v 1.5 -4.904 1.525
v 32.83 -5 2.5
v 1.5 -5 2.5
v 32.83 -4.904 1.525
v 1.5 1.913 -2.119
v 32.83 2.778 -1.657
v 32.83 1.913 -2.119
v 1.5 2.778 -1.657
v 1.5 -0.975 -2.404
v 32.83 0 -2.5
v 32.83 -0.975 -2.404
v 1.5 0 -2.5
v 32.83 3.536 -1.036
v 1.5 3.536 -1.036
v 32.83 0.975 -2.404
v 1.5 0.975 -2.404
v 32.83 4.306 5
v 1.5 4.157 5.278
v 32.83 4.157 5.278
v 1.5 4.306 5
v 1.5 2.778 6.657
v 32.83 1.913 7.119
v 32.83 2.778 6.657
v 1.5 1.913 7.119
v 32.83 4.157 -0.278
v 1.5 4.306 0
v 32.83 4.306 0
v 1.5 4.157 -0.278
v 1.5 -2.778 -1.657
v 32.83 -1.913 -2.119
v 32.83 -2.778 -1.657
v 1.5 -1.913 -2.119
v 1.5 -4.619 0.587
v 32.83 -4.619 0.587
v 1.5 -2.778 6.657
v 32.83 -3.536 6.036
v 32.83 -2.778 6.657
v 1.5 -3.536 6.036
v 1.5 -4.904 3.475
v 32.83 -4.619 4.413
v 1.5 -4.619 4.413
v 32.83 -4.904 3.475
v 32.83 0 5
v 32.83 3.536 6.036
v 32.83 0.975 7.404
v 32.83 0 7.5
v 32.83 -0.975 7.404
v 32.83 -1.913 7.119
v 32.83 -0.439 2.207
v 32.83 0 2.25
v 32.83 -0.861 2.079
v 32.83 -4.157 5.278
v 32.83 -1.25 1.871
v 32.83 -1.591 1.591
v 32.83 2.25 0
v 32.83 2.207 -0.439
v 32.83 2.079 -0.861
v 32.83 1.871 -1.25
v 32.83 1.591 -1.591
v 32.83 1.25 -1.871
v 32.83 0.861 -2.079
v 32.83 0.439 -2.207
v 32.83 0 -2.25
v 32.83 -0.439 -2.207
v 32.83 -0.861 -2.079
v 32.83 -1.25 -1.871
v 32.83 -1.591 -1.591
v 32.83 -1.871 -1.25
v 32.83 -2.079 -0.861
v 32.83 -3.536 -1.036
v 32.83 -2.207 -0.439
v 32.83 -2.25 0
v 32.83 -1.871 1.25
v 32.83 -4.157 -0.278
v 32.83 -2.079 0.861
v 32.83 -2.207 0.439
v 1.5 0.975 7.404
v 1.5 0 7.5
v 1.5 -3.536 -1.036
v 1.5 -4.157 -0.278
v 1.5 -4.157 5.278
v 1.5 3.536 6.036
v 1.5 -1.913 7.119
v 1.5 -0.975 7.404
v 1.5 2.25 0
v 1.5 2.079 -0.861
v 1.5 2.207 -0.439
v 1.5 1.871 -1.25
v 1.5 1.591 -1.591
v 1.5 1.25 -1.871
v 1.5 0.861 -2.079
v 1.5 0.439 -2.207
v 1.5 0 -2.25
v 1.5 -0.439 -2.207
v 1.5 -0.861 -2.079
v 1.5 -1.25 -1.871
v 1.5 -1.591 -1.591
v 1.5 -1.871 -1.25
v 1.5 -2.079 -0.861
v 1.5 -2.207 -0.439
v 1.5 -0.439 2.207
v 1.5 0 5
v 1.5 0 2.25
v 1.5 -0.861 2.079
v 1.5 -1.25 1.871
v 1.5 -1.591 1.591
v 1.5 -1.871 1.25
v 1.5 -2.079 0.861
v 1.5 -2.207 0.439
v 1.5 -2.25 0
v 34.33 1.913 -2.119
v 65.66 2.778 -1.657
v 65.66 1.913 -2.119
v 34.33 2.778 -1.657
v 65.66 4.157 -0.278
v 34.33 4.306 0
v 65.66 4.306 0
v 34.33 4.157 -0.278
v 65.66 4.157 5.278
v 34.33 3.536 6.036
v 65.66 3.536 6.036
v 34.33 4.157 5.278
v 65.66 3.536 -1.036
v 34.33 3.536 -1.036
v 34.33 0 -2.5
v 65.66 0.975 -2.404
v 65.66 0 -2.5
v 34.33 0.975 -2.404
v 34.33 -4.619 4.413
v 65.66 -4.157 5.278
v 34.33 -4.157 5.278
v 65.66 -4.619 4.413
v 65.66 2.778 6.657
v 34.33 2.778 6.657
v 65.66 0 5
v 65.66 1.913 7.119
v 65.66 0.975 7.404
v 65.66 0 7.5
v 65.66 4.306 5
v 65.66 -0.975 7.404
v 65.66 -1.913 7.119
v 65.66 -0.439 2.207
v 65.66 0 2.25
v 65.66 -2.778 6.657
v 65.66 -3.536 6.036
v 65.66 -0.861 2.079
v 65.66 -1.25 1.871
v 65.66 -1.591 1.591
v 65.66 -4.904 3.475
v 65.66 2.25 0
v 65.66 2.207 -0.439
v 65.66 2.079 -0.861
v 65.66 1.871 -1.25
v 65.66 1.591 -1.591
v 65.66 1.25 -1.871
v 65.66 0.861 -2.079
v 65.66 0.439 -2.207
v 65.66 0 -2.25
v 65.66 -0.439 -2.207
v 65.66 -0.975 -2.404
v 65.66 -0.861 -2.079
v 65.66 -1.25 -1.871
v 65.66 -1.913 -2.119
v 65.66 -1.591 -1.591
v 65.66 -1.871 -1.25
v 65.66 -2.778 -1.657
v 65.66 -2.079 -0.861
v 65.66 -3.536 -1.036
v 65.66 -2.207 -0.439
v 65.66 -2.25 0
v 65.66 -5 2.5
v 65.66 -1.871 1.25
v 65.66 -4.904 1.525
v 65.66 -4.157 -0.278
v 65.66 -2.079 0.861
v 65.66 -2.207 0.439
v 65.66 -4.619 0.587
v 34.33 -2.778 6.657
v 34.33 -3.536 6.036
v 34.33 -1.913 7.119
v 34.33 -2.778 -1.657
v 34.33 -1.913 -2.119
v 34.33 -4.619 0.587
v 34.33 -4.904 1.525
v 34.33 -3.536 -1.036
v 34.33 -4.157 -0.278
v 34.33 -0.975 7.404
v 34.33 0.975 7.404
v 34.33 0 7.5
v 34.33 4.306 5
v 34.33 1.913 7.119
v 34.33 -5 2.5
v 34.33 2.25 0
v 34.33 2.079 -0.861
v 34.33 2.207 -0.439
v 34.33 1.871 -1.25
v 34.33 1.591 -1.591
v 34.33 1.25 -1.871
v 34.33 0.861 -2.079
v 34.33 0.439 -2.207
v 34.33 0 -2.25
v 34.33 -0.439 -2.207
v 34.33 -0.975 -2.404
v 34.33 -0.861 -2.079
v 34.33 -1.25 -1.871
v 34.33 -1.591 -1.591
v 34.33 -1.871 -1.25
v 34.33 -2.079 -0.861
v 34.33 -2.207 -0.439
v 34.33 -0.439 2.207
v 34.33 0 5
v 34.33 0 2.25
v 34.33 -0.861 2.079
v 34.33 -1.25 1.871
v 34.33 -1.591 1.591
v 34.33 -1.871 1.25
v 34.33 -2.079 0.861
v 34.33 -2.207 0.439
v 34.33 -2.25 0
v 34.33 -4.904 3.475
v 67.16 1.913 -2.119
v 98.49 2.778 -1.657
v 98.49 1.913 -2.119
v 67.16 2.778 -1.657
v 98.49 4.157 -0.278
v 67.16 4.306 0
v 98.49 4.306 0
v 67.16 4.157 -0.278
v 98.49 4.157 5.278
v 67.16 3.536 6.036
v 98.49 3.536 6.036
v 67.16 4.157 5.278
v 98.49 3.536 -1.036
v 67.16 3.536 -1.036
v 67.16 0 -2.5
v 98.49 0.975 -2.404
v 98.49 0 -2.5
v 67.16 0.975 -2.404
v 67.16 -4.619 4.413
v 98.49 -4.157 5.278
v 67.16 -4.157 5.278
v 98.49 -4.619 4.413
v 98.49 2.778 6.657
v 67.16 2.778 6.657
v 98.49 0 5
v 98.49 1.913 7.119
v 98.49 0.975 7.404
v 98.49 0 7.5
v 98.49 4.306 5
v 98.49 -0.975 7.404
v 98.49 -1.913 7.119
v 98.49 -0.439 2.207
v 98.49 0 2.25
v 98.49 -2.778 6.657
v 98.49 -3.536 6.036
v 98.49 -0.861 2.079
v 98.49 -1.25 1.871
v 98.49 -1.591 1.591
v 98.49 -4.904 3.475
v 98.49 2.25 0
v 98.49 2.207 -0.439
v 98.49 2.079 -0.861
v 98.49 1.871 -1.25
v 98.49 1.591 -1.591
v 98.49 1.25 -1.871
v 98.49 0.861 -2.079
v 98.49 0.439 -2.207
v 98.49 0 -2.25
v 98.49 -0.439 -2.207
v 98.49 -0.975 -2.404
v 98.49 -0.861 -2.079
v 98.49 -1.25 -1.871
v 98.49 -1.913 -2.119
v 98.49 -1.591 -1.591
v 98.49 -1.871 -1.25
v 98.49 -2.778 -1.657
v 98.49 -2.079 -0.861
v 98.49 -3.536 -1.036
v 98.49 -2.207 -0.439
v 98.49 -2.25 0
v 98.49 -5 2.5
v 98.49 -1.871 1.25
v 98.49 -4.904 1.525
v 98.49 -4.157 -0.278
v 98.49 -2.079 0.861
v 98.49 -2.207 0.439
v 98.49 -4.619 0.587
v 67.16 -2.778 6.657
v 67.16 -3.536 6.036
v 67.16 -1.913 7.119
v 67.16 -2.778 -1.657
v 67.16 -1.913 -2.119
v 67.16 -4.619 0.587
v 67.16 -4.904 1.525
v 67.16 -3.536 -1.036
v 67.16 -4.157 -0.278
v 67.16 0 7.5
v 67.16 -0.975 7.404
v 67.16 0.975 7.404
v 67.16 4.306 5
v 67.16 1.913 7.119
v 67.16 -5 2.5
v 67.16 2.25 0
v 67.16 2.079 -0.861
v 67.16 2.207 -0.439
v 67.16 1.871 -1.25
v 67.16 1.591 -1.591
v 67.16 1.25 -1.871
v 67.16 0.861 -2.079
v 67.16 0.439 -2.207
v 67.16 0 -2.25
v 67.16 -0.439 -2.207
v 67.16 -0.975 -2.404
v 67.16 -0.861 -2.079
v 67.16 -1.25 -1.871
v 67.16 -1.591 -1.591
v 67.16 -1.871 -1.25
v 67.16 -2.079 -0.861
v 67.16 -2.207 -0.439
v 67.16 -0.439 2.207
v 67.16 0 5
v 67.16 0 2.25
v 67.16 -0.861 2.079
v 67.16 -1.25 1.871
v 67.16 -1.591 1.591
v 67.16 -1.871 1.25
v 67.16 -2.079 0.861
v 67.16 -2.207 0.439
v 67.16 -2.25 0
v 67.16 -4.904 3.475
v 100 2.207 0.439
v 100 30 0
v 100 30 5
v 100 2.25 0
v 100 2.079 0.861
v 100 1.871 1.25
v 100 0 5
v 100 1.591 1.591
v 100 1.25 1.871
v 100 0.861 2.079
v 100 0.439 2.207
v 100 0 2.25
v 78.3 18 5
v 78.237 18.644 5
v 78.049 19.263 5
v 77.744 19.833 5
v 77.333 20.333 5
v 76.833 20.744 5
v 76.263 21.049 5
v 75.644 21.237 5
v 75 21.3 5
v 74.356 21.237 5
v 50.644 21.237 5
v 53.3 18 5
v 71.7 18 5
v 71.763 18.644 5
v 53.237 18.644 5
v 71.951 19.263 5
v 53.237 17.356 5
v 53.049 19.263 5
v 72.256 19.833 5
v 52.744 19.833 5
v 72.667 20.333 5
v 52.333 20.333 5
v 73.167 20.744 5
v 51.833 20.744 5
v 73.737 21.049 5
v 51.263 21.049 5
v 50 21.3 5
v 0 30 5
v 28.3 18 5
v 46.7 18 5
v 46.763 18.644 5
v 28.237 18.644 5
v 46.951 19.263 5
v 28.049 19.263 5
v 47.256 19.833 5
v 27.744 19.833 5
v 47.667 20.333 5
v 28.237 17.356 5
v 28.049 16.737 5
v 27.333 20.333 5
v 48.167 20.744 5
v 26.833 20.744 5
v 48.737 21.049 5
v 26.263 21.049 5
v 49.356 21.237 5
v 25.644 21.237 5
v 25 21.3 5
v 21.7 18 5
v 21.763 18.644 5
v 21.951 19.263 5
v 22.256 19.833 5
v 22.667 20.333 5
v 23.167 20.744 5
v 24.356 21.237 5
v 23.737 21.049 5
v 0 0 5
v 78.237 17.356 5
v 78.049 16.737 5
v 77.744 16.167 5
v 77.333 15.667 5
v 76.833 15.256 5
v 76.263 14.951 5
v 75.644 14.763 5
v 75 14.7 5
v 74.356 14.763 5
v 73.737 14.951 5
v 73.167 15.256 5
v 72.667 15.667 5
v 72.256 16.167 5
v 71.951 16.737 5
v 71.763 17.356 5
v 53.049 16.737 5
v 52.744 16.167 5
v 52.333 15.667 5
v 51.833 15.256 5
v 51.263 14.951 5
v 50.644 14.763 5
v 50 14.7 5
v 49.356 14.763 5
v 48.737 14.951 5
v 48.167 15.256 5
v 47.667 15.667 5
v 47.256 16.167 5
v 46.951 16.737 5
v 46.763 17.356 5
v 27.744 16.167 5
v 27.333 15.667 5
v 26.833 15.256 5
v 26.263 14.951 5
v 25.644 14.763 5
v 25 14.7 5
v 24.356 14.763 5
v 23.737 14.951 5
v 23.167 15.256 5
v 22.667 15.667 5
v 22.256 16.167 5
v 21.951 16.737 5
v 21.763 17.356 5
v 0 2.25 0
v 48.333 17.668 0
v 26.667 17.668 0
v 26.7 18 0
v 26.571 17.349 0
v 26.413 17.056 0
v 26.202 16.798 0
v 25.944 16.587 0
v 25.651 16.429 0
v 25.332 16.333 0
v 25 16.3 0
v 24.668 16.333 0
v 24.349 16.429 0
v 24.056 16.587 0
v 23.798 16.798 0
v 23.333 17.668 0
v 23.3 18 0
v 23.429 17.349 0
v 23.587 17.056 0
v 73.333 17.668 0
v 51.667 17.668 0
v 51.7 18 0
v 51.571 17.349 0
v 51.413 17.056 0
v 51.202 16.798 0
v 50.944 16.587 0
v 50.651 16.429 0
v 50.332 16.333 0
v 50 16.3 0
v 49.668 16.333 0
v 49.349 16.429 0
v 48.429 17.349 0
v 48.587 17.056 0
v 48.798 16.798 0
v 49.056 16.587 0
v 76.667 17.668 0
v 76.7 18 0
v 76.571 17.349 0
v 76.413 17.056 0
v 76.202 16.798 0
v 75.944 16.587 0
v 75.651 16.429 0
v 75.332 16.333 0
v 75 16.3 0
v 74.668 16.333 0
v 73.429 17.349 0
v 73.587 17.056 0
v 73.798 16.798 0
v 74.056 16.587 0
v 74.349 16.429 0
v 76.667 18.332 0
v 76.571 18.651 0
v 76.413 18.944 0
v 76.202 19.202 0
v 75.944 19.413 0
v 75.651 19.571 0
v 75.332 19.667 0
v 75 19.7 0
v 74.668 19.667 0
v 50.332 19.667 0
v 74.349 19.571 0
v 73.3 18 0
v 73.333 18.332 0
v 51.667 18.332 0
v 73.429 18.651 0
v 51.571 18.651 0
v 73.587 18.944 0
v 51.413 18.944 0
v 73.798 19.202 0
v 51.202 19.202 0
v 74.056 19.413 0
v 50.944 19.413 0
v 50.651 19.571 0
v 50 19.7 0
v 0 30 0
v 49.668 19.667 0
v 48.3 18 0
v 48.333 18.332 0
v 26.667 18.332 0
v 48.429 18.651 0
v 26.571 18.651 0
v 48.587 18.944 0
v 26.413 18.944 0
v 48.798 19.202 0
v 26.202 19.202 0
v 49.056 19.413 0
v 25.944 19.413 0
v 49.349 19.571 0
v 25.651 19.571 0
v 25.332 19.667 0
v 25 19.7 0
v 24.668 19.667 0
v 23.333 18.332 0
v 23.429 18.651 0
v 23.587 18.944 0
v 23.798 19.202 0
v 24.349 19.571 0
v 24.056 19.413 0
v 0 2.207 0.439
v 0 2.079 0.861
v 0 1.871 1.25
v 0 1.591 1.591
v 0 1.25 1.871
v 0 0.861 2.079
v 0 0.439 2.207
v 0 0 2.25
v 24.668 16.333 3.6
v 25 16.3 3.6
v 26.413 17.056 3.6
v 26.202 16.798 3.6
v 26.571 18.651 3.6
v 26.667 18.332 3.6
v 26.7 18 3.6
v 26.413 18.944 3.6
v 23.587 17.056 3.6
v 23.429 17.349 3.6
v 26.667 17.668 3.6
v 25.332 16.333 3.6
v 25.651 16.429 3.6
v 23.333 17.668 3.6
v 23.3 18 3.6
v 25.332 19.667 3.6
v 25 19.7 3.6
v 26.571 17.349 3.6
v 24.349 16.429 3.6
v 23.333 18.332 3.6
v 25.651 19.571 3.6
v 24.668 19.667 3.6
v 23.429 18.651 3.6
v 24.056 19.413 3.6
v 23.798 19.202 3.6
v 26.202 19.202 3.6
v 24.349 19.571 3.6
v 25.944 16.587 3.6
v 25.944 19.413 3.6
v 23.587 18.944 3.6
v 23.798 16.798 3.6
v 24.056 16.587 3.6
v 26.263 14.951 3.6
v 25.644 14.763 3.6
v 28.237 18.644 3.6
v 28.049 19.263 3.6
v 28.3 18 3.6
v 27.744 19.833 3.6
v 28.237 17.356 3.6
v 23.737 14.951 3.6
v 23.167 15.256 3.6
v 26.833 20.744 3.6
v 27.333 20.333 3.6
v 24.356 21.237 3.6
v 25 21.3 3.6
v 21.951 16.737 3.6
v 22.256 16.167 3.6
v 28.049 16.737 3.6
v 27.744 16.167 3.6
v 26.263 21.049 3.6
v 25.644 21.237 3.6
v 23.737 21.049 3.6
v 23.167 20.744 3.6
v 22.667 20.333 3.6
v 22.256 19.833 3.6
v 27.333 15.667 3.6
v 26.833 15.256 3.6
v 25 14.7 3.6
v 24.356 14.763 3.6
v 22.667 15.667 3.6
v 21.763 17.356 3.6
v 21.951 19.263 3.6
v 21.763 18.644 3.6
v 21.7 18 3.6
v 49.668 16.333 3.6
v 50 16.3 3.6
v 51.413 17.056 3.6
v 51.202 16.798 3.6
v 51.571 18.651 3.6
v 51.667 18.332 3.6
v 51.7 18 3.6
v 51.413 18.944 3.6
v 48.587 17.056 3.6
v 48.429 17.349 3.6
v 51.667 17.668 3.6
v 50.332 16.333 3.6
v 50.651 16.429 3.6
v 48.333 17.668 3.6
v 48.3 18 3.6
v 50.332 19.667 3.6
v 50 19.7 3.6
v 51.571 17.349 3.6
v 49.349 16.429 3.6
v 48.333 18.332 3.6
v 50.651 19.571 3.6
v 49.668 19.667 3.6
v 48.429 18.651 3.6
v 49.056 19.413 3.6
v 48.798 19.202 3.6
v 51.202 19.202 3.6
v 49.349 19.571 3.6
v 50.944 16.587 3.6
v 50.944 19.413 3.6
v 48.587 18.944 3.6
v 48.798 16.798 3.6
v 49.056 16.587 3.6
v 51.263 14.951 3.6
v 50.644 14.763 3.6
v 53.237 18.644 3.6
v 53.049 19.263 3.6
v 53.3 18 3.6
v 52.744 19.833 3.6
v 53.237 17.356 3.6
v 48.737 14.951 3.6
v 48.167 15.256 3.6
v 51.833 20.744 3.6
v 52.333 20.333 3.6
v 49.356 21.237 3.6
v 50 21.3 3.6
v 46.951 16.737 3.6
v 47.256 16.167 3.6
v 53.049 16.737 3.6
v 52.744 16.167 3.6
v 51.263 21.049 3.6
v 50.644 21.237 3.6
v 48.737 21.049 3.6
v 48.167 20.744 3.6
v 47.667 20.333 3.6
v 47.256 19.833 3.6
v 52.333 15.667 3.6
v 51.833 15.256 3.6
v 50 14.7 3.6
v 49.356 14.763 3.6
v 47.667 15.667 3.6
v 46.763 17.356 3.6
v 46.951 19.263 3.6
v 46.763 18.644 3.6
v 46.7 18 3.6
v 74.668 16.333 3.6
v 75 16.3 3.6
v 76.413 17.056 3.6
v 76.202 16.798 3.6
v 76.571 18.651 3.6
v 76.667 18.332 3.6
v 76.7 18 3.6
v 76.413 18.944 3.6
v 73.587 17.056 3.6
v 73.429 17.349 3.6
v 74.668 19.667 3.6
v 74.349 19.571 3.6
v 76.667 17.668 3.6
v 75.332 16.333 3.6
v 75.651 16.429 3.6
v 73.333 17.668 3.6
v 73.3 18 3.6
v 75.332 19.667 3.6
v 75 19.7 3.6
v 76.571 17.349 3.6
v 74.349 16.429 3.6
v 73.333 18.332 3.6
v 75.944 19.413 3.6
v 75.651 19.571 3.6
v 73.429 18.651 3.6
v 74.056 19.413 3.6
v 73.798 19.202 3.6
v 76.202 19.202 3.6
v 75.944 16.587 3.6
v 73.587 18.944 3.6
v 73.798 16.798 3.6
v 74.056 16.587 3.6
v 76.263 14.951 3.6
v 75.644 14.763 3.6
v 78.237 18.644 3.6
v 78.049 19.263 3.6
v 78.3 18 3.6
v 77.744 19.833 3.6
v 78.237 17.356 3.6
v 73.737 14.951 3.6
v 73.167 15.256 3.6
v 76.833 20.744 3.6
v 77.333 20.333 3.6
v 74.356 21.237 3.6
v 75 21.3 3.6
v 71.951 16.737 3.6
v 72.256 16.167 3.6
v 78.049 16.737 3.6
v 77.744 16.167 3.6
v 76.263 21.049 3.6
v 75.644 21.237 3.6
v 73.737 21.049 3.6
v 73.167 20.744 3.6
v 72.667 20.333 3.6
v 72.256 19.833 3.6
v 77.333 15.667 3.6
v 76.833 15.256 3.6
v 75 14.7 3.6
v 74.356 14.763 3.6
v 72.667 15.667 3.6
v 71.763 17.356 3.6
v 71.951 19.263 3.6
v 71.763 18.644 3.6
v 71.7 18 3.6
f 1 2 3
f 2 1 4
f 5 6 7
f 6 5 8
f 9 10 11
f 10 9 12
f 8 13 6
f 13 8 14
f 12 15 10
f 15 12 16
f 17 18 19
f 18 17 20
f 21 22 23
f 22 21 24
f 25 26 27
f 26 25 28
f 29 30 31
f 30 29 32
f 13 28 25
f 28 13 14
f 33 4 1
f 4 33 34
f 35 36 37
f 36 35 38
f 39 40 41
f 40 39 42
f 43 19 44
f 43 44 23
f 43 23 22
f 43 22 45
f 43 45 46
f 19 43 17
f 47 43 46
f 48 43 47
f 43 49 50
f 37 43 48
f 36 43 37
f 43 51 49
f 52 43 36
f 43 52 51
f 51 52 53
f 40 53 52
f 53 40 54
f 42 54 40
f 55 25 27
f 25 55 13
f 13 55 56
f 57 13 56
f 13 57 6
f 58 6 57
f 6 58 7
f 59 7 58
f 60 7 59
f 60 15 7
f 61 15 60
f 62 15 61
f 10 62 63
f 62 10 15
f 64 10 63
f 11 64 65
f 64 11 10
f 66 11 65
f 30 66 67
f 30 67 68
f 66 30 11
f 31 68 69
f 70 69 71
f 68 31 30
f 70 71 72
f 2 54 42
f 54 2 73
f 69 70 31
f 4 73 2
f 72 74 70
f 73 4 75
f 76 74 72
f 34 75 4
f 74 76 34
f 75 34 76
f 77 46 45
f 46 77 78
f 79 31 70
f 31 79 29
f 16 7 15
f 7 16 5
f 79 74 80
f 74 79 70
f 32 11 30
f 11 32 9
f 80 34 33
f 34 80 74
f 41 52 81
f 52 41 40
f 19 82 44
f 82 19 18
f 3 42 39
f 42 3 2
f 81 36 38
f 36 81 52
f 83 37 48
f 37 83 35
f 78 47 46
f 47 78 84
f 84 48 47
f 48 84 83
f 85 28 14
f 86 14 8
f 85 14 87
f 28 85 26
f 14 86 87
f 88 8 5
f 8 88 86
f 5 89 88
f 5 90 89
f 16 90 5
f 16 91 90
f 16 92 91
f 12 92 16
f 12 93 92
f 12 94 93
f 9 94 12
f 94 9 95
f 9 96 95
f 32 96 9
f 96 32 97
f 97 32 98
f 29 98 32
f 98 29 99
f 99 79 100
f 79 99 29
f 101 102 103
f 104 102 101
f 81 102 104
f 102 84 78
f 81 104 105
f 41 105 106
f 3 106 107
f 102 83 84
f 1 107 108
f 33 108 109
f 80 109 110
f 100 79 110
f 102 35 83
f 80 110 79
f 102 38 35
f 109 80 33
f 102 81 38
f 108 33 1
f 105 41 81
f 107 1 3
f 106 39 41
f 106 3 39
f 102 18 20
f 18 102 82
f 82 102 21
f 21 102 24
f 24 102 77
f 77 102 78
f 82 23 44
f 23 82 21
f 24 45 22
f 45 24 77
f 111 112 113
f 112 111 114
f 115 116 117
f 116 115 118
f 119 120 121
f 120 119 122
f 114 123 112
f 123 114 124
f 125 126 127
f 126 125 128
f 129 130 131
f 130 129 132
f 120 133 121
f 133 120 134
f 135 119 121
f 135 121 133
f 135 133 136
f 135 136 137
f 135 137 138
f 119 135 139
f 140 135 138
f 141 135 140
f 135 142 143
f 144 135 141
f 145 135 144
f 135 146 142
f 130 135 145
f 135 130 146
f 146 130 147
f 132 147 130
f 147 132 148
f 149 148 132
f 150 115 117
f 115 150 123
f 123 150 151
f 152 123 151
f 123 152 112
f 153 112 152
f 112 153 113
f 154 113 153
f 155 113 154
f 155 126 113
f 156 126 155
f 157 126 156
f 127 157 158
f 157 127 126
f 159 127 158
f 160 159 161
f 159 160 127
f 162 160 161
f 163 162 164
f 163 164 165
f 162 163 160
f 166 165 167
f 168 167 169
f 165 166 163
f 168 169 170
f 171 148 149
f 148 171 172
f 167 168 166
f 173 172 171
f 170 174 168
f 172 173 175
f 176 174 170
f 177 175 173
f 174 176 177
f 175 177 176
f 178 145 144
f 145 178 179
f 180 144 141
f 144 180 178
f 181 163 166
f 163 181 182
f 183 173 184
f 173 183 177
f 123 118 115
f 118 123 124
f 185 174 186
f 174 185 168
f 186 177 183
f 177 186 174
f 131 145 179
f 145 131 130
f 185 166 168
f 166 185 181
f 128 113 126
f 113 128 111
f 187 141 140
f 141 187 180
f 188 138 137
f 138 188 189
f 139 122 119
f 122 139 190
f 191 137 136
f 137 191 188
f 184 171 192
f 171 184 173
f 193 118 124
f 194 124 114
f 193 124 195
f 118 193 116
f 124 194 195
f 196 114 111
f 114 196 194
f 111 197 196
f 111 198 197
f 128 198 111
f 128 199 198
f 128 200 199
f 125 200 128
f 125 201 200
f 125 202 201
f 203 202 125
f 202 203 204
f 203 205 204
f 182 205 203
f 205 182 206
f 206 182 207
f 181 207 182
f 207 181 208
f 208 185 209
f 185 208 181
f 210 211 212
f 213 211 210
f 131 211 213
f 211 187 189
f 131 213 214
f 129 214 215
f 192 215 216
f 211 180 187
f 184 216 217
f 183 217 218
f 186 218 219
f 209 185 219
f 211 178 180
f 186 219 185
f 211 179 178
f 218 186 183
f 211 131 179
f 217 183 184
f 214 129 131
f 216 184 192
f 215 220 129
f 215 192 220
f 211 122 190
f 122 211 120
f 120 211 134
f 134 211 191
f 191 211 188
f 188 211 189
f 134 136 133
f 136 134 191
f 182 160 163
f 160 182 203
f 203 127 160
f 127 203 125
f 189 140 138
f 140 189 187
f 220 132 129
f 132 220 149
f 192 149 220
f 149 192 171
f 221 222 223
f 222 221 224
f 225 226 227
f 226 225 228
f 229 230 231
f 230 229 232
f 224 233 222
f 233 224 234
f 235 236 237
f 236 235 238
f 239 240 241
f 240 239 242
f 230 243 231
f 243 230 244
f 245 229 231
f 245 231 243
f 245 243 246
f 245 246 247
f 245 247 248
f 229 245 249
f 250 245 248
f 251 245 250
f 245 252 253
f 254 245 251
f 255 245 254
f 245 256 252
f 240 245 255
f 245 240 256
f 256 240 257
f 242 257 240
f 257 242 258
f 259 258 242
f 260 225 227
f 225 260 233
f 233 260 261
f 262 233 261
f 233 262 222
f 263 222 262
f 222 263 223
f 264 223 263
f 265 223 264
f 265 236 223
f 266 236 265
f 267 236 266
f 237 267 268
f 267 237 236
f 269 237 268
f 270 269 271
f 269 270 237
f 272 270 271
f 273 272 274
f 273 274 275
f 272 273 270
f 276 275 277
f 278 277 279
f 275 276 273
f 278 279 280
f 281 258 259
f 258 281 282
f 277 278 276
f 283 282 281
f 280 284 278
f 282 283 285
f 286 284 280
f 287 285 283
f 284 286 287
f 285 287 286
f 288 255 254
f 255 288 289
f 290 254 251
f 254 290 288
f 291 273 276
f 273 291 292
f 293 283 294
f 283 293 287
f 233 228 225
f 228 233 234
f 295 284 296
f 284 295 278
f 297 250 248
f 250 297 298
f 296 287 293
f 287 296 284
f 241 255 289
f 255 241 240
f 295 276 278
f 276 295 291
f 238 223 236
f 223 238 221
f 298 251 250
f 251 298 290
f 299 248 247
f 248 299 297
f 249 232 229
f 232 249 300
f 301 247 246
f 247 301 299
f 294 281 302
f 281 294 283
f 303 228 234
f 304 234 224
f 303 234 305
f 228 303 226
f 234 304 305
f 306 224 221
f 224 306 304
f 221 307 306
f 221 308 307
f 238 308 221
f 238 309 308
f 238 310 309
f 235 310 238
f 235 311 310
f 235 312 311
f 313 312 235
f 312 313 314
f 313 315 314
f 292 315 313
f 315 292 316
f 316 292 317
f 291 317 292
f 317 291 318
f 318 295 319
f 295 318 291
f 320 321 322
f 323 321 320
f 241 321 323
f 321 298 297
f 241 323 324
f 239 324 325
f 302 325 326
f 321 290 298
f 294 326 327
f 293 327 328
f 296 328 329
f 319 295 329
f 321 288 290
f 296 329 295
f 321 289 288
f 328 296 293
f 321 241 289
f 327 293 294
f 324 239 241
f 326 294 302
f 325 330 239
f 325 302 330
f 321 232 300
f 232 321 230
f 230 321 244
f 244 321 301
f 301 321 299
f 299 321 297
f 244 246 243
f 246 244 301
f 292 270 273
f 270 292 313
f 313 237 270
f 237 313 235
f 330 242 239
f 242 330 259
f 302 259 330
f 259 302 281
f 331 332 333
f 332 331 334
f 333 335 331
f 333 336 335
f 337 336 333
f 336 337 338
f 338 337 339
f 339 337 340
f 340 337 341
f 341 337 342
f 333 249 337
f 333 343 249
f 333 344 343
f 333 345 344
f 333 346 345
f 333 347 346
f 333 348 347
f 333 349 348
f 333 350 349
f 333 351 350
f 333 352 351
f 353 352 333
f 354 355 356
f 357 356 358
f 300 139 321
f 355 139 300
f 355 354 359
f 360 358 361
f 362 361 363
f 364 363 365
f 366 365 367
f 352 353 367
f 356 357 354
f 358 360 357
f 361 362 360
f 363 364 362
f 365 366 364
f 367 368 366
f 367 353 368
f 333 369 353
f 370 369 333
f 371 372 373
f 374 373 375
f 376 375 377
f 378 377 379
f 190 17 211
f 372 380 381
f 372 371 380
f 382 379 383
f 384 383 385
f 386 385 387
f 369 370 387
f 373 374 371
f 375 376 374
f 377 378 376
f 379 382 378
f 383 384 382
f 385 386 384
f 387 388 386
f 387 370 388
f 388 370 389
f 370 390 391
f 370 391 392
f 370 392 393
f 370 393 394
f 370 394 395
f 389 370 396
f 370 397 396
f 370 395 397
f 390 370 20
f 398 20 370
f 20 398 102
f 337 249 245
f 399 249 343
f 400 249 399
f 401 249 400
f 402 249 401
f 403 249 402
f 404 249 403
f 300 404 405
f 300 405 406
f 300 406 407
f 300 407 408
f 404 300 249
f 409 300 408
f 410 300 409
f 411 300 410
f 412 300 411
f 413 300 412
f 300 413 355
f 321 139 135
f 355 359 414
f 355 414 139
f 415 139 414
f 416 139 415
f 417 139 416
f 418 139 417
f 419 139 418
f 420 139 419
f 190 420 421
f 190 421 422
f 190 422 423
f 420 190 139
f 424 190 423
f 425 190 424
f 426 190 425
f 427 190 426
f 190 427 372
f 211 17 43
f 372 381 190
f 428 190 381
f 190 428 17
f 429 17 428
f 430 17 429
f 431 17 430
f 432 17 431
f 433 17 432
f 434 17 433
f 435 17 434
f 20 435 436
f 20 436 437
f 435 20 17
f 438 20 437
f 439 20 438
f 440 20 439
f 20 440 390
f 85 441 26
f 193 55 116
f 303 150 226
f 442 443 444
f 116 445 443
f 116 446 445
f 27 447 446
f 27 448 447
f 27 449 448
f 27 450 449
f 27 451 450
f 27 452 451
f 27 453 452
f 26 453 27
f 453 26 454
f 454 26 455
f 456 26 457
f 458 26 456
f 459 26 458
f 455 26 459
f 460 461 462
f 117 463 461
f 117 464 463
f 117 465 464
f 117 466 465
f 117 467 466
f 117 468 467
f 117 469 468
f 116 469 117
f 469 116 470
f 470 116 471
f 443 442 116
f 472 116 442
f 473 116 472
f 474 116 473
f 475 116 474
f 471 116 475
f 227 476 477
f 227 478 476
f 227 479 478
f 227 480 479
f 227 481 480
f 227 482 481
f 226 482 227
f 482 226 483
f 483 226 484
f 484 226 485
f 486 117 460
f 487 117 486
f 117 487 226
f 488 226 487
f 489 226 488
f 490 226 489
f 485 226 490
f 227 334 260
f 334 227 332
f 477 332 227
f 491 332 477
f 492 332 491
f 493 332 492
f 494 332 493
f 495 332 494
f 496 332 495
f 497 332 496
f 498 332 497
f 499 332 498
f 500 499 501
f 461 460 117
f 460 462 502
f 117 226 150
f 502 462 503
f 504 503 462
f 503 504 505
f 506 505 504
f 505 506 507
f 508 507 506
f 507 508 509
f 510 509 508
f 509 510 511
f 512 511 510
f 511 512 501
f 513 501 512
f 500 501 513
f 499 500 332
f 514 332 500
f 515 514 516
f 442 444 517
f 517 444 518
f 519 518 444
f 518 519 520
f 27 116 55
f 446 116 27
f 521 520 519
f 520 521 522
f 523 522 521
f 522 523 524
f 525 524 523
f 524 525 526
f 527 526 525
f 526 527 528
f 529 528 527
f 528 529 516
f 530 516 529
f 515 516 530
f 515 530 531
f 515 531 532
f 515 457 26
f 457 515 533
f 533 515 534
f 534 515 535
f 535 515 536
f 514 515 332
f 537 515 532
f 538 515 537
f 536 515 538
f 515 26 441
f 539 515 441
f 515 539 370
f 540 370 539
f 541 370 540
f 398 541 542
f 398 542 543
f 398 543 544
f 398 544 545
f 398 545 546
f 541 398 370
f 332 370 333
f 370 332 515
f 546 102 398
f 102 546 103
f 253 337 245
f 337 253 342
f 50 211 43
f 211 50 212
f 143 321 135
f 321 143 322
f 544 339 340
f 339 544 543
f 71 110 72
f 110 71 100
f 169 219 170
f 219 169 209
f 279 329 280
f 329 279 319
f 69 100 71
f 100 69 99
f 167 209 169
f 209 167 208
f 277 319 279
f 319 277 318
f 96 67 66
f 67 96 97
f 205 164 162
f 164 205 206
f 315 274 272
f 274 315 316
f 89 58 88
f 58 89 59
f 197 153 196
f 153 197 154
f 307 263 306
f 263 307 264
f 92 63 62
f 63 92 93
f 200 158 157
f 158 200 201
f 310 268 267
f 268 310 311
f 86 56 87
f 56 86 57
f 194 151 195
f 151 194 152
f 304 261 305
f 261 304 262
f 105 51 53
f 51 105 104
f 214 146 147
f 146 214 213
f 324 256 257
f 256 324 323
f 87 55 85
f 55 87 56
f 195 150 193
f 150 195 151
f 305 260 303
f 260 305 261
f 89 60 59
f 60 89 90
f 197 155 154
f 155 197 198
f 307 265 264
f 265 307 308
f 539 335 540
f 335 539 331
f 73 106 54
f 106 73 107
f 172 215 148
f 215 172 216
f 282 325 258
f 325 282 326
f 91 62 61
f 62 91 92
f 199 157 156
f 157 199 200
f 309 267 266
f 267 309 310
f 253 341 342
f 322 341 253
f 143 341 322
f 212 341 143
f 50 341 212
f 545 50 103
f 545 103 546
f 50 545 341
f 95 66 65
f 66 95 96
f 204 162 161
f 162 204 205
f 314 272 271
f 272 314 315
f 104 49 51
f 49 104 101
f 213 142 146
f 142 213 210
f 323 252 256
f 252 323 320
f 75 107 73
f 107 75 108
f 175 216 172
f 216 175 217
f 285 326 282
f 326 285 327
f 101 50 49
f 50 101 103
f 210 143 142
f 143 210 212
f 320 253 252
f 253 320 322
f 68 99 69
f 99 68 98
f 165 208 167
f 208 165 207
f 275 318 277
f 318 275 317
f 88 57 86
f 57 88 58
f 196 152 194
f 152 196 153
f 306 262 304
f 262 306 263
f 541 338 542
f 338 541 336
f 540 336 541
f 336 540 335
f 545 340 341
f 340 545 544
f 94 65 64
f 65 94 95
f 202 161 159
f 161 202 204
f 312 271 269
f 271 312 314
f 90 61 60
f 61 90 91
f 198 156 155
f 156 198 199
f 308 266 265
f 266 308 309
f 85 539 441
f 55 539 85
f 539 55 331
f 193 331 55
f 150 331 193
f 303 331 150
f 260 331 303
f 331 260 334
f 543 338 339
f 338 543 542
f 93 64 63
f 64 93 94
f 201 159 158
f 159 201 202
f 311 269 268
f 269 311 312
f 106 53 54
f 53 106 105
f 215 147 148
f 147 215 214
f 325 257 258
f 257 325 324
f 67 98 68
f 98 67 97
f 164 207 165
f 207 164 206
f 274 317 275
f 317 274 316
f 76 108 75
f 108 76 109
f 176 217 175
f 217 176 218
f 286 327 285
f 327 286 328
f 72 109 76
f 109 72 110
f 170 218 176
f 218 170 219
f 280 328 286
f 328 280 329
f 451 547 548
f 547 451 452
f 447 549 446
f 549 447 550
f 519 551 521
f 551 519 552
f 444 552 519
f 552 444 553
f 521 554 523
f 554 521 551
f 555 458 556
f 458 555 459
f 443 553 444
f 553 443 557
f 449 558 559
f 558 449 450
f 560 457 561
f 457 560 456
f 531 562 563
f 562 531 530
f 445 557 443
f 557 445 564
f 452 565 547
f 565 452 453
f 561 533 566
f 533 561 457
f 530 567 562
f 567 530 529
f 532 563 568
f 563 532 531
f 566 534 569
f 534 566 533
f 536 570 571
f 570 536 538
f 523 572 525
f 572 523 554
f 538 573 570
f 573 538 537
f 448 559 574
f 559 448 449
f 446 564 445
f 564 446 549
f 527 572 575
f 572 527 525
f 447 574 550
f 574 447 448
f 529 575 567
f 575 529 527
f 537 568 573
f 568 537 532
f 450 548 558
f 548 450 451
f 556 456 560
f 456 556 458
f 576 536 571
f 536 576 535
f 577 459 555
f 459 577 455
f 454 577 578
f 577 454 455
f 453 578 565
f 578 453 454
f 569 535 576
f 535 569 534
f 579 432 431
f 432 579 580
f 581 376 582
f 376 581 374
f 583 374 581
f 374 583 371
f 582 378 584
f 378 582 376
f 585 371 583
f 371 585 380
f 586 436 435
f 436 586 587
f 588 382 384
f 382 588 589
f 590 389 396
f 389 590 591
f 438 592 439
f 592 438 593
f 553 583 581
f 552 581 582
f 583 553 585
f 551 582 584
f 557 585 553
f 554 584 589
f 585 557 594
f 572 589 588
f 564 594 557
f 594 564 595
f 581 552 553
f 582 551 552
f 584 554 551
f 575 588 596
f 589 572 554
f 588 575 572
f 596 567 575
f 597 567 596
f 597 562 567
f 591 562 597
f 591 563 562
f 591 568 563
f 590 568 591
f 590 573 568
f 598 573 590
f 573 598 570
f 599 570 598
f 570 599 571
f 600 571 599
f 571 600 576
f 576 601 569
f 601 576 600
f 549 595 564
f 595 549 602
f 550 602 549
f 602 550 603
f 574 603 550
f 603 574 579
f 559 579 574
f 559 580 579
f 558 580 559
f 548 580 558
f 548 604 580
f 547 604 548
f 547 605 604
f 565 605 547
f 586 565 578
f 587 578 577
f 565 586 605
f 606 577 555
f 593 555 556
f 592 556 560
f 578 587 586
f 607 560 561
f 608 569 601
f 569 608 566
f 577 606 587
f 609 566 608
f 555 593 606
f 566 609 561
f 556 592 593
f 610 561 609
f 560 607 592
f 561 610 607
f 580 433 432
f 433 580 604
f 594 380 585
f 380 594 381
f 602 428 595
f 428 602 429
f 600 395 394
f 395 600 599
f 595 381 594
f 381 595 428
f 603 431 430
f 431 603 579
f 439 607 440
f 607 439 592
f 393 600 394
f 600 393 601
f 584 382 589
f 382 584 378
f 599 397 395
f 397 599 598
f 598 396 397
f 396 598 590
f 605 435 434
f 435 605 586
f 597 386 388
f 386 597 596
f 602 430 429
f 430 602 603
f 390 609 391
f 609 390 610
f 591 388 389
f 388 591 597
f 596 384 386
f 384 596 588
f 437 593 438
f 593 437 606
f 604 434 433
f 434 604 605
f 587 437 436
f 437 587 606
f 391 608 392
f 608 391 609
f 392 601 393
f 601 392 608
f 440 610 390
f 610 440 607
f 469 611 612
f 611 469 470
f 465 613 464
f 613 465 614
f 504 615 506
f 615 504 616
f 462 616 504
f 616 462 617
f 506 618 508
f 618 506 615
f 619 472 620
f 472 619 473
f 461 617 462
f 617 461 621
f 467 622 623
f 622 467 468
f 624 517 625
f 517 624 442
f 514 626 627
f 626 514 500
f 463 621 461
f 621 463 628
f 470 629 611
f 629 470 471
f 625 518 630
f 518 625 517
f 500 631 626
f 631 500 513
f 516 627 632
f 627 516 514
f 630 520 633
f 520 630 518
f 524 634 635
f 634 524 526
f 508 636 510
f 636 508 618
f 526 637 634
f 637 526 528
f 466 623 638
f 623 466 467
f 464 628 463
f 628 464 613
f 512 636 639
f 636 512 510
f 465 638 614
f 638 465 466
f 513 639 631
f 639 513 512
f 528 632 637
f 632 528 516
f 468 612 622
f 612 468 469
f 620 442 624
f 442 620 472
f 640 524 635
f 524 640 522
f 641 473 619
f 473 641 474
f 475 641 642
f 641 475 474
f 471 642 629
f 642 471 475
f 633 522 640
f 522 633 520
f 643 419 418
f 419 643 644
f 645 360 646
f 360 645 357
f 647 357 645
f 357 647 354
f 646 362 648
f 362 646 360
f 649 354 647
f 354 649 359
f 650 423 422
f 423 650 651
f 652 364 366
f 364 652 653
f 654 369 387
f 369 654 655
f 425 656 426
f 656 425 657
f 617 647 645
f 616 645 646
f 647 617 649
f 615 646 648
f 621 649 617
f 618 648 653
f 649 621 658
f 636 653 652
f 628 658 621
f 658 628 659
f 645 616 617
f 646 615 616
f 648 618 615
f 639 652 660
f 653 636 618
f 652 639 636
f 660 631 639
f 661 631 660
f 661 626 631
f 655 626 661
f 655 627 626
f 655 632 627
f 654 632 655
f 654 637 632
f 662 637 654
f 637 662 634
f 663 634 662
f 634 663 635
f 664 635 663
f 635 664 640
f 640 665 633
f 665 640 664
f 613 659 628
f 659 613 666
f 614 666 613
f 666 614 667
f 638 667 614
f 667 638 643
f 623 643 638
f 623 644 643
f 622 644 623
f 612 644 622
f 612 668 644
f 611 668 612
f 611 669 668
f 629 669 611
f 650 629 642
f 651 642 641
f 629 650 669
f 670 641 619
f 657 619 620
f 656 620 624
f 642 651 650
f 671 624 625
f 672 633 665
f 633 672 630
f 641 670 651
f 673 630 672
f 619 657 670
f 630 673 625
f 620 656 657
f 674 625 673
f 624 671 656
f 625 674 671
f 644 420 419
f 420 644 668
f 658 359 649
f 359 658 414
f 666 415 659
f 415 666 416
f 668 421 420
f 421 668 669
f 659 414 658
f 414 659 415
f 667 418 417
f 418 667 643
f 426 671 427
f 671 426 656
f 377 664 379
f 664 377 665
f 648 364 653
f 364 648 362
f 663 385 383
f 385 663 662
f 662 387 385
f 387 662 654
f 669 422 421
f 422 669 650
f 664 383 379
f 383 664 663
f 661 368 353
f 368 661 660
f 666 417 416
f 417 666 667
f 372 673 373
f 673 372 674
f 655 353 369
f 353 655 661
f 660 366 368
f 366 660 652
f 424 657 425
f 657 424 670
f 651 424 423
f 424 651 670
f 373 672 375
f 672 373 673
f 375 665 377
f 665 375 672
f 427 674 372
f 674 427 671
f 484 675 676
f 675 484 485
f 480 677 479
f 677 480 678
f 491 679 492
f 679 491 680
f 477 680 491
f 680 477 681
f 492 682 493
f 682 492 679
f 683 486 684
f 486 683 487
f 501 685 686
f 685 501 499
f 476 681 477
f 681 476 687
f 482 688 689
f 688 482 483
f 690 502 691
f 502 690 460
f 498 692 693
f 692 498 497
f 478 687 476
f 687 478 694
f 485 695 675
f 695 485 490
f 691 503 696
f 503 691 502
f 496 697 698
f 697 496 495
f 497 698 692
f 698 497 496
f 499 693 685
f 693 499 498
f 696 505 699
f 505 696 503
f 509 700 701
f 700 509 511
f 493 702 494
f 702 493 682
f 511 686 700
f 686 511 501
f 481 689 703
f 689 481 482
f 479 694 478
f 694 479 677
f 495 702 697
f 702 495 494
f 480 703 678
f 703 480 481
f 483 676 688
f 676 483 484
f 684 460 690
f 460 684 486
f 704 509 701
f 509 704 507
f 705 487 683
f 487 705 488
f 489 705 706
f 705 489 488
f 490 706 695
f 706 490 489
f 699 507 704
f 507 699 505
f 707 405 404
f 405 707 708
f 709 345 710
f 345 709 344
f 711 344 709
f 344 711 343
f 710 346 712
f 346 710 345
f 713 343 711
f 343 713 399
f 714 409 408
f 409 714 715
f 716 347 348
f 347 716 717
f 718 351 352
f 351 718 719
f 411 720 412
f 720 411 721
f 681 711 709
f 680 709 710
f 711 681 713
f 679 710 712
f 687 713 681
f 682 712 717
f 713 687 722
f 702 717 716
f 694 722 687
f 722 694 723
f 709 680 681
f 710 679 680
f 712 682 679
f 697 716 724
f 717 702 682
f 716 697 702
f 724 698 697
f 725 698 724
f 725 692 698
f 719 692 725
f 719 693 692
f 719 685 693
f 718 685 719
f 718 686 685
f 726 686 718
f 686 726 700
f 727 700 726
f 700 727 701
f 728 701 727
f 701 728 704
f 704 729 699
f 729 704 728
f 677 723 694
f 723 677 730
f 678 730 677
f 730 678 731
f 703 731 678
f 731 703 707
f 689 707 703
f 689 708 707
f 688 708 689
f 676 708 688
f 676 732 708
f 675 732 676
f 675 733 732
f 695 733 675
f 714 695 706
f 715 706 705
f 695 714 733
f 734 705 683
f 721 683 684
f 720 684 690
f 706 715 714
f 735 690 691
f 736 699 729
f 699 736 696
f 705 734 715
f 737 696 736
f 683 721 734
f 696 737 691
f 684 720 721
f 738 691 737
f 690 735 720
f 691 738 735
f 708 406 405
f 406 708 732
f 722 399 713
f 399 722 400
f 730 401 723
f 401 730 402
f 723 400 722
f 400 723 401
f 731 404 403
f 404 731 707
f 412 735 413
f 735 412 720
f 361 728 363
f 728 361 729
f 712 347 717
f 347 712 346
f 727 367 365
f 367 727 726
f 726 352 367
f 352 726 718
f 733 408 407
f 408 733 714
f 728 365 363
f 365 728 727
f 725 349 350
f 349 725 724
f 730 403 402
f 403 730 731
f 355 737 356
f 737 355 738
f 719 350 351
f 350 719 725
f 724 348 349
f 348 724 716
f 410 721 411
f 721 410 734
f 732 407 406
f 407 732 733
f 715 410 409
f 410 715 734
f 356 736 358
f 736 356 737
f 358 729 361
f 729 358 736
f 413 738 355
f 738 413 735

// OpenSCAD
$fn = 32;

// ----------------------------------------------------------------------
// Hinge leaf: 100 x 35 x 10 mm
// ----------------------------------------------------------------------

// --- parameters (mm) ---
plate_len = 100;          // leaf length, X
plate_w = 30;             // leaf width, Y
plate_t = 5;              // leaf thickness
barrel_d = 10;            // knuckle diameter
barrel_w = 31.33;         // knuckle width
knuckle_n = 3;            // number of knuckles
pin_d = 4.5;              // pin bore
gap = 1.5;                // gap between the knuckles
screw_d = 3.4;            // screw clearance
cs_d = 6.6;               // countersink diameter
cs_h = 1.4;               // countersink depth

module leaf() {
  cube([plate_len, plate_w, plate_t]);
}

module knuckles() {
  /* barrels sit on the leaf edge, the pin axis at half the leaf thickness */
  for (i = [0 : knuckle_n - 1])
    translate([gap + i * (barrel_w + gap), 0, plate_t * 0.5])
      rotate([0, 90, 0]) cylinder(h = barrel_w, d = barrel_d);
}

difference() {
  union() {
    leaf();
    knuckles();
  }
  rotate([0, 90, 0]) translate([0, 0, -1])
    cylinder(h = plate_len + 2, d = pin_d);
  translate([25, plate_w * 0.6, -1]) cylinder(h = plate_t + 2, d = screw_d);
  translate([25, plate_w * 0.6, plate_t - cs_h]) cylinder(h = cs_h + 0.5, d = cs_d);
  translate([50, plate_w * 0.6, -1]) cylinder(h = plate_t + 2, d = screw_d);
  translate([50, plate_w * 0.6, plate_t - cs_h]) cylinder(h = cs_h + 0.5, d = cs_d);
  translate([75, plate_w * 0.6, -1]) cylinder(h = plate_t + 2, d = screw_d);
  translate([75, plate_w * 0.6, plate_t - cs_h]) cylinder(h = cs_h + 0.5, d = cs_d);
}
